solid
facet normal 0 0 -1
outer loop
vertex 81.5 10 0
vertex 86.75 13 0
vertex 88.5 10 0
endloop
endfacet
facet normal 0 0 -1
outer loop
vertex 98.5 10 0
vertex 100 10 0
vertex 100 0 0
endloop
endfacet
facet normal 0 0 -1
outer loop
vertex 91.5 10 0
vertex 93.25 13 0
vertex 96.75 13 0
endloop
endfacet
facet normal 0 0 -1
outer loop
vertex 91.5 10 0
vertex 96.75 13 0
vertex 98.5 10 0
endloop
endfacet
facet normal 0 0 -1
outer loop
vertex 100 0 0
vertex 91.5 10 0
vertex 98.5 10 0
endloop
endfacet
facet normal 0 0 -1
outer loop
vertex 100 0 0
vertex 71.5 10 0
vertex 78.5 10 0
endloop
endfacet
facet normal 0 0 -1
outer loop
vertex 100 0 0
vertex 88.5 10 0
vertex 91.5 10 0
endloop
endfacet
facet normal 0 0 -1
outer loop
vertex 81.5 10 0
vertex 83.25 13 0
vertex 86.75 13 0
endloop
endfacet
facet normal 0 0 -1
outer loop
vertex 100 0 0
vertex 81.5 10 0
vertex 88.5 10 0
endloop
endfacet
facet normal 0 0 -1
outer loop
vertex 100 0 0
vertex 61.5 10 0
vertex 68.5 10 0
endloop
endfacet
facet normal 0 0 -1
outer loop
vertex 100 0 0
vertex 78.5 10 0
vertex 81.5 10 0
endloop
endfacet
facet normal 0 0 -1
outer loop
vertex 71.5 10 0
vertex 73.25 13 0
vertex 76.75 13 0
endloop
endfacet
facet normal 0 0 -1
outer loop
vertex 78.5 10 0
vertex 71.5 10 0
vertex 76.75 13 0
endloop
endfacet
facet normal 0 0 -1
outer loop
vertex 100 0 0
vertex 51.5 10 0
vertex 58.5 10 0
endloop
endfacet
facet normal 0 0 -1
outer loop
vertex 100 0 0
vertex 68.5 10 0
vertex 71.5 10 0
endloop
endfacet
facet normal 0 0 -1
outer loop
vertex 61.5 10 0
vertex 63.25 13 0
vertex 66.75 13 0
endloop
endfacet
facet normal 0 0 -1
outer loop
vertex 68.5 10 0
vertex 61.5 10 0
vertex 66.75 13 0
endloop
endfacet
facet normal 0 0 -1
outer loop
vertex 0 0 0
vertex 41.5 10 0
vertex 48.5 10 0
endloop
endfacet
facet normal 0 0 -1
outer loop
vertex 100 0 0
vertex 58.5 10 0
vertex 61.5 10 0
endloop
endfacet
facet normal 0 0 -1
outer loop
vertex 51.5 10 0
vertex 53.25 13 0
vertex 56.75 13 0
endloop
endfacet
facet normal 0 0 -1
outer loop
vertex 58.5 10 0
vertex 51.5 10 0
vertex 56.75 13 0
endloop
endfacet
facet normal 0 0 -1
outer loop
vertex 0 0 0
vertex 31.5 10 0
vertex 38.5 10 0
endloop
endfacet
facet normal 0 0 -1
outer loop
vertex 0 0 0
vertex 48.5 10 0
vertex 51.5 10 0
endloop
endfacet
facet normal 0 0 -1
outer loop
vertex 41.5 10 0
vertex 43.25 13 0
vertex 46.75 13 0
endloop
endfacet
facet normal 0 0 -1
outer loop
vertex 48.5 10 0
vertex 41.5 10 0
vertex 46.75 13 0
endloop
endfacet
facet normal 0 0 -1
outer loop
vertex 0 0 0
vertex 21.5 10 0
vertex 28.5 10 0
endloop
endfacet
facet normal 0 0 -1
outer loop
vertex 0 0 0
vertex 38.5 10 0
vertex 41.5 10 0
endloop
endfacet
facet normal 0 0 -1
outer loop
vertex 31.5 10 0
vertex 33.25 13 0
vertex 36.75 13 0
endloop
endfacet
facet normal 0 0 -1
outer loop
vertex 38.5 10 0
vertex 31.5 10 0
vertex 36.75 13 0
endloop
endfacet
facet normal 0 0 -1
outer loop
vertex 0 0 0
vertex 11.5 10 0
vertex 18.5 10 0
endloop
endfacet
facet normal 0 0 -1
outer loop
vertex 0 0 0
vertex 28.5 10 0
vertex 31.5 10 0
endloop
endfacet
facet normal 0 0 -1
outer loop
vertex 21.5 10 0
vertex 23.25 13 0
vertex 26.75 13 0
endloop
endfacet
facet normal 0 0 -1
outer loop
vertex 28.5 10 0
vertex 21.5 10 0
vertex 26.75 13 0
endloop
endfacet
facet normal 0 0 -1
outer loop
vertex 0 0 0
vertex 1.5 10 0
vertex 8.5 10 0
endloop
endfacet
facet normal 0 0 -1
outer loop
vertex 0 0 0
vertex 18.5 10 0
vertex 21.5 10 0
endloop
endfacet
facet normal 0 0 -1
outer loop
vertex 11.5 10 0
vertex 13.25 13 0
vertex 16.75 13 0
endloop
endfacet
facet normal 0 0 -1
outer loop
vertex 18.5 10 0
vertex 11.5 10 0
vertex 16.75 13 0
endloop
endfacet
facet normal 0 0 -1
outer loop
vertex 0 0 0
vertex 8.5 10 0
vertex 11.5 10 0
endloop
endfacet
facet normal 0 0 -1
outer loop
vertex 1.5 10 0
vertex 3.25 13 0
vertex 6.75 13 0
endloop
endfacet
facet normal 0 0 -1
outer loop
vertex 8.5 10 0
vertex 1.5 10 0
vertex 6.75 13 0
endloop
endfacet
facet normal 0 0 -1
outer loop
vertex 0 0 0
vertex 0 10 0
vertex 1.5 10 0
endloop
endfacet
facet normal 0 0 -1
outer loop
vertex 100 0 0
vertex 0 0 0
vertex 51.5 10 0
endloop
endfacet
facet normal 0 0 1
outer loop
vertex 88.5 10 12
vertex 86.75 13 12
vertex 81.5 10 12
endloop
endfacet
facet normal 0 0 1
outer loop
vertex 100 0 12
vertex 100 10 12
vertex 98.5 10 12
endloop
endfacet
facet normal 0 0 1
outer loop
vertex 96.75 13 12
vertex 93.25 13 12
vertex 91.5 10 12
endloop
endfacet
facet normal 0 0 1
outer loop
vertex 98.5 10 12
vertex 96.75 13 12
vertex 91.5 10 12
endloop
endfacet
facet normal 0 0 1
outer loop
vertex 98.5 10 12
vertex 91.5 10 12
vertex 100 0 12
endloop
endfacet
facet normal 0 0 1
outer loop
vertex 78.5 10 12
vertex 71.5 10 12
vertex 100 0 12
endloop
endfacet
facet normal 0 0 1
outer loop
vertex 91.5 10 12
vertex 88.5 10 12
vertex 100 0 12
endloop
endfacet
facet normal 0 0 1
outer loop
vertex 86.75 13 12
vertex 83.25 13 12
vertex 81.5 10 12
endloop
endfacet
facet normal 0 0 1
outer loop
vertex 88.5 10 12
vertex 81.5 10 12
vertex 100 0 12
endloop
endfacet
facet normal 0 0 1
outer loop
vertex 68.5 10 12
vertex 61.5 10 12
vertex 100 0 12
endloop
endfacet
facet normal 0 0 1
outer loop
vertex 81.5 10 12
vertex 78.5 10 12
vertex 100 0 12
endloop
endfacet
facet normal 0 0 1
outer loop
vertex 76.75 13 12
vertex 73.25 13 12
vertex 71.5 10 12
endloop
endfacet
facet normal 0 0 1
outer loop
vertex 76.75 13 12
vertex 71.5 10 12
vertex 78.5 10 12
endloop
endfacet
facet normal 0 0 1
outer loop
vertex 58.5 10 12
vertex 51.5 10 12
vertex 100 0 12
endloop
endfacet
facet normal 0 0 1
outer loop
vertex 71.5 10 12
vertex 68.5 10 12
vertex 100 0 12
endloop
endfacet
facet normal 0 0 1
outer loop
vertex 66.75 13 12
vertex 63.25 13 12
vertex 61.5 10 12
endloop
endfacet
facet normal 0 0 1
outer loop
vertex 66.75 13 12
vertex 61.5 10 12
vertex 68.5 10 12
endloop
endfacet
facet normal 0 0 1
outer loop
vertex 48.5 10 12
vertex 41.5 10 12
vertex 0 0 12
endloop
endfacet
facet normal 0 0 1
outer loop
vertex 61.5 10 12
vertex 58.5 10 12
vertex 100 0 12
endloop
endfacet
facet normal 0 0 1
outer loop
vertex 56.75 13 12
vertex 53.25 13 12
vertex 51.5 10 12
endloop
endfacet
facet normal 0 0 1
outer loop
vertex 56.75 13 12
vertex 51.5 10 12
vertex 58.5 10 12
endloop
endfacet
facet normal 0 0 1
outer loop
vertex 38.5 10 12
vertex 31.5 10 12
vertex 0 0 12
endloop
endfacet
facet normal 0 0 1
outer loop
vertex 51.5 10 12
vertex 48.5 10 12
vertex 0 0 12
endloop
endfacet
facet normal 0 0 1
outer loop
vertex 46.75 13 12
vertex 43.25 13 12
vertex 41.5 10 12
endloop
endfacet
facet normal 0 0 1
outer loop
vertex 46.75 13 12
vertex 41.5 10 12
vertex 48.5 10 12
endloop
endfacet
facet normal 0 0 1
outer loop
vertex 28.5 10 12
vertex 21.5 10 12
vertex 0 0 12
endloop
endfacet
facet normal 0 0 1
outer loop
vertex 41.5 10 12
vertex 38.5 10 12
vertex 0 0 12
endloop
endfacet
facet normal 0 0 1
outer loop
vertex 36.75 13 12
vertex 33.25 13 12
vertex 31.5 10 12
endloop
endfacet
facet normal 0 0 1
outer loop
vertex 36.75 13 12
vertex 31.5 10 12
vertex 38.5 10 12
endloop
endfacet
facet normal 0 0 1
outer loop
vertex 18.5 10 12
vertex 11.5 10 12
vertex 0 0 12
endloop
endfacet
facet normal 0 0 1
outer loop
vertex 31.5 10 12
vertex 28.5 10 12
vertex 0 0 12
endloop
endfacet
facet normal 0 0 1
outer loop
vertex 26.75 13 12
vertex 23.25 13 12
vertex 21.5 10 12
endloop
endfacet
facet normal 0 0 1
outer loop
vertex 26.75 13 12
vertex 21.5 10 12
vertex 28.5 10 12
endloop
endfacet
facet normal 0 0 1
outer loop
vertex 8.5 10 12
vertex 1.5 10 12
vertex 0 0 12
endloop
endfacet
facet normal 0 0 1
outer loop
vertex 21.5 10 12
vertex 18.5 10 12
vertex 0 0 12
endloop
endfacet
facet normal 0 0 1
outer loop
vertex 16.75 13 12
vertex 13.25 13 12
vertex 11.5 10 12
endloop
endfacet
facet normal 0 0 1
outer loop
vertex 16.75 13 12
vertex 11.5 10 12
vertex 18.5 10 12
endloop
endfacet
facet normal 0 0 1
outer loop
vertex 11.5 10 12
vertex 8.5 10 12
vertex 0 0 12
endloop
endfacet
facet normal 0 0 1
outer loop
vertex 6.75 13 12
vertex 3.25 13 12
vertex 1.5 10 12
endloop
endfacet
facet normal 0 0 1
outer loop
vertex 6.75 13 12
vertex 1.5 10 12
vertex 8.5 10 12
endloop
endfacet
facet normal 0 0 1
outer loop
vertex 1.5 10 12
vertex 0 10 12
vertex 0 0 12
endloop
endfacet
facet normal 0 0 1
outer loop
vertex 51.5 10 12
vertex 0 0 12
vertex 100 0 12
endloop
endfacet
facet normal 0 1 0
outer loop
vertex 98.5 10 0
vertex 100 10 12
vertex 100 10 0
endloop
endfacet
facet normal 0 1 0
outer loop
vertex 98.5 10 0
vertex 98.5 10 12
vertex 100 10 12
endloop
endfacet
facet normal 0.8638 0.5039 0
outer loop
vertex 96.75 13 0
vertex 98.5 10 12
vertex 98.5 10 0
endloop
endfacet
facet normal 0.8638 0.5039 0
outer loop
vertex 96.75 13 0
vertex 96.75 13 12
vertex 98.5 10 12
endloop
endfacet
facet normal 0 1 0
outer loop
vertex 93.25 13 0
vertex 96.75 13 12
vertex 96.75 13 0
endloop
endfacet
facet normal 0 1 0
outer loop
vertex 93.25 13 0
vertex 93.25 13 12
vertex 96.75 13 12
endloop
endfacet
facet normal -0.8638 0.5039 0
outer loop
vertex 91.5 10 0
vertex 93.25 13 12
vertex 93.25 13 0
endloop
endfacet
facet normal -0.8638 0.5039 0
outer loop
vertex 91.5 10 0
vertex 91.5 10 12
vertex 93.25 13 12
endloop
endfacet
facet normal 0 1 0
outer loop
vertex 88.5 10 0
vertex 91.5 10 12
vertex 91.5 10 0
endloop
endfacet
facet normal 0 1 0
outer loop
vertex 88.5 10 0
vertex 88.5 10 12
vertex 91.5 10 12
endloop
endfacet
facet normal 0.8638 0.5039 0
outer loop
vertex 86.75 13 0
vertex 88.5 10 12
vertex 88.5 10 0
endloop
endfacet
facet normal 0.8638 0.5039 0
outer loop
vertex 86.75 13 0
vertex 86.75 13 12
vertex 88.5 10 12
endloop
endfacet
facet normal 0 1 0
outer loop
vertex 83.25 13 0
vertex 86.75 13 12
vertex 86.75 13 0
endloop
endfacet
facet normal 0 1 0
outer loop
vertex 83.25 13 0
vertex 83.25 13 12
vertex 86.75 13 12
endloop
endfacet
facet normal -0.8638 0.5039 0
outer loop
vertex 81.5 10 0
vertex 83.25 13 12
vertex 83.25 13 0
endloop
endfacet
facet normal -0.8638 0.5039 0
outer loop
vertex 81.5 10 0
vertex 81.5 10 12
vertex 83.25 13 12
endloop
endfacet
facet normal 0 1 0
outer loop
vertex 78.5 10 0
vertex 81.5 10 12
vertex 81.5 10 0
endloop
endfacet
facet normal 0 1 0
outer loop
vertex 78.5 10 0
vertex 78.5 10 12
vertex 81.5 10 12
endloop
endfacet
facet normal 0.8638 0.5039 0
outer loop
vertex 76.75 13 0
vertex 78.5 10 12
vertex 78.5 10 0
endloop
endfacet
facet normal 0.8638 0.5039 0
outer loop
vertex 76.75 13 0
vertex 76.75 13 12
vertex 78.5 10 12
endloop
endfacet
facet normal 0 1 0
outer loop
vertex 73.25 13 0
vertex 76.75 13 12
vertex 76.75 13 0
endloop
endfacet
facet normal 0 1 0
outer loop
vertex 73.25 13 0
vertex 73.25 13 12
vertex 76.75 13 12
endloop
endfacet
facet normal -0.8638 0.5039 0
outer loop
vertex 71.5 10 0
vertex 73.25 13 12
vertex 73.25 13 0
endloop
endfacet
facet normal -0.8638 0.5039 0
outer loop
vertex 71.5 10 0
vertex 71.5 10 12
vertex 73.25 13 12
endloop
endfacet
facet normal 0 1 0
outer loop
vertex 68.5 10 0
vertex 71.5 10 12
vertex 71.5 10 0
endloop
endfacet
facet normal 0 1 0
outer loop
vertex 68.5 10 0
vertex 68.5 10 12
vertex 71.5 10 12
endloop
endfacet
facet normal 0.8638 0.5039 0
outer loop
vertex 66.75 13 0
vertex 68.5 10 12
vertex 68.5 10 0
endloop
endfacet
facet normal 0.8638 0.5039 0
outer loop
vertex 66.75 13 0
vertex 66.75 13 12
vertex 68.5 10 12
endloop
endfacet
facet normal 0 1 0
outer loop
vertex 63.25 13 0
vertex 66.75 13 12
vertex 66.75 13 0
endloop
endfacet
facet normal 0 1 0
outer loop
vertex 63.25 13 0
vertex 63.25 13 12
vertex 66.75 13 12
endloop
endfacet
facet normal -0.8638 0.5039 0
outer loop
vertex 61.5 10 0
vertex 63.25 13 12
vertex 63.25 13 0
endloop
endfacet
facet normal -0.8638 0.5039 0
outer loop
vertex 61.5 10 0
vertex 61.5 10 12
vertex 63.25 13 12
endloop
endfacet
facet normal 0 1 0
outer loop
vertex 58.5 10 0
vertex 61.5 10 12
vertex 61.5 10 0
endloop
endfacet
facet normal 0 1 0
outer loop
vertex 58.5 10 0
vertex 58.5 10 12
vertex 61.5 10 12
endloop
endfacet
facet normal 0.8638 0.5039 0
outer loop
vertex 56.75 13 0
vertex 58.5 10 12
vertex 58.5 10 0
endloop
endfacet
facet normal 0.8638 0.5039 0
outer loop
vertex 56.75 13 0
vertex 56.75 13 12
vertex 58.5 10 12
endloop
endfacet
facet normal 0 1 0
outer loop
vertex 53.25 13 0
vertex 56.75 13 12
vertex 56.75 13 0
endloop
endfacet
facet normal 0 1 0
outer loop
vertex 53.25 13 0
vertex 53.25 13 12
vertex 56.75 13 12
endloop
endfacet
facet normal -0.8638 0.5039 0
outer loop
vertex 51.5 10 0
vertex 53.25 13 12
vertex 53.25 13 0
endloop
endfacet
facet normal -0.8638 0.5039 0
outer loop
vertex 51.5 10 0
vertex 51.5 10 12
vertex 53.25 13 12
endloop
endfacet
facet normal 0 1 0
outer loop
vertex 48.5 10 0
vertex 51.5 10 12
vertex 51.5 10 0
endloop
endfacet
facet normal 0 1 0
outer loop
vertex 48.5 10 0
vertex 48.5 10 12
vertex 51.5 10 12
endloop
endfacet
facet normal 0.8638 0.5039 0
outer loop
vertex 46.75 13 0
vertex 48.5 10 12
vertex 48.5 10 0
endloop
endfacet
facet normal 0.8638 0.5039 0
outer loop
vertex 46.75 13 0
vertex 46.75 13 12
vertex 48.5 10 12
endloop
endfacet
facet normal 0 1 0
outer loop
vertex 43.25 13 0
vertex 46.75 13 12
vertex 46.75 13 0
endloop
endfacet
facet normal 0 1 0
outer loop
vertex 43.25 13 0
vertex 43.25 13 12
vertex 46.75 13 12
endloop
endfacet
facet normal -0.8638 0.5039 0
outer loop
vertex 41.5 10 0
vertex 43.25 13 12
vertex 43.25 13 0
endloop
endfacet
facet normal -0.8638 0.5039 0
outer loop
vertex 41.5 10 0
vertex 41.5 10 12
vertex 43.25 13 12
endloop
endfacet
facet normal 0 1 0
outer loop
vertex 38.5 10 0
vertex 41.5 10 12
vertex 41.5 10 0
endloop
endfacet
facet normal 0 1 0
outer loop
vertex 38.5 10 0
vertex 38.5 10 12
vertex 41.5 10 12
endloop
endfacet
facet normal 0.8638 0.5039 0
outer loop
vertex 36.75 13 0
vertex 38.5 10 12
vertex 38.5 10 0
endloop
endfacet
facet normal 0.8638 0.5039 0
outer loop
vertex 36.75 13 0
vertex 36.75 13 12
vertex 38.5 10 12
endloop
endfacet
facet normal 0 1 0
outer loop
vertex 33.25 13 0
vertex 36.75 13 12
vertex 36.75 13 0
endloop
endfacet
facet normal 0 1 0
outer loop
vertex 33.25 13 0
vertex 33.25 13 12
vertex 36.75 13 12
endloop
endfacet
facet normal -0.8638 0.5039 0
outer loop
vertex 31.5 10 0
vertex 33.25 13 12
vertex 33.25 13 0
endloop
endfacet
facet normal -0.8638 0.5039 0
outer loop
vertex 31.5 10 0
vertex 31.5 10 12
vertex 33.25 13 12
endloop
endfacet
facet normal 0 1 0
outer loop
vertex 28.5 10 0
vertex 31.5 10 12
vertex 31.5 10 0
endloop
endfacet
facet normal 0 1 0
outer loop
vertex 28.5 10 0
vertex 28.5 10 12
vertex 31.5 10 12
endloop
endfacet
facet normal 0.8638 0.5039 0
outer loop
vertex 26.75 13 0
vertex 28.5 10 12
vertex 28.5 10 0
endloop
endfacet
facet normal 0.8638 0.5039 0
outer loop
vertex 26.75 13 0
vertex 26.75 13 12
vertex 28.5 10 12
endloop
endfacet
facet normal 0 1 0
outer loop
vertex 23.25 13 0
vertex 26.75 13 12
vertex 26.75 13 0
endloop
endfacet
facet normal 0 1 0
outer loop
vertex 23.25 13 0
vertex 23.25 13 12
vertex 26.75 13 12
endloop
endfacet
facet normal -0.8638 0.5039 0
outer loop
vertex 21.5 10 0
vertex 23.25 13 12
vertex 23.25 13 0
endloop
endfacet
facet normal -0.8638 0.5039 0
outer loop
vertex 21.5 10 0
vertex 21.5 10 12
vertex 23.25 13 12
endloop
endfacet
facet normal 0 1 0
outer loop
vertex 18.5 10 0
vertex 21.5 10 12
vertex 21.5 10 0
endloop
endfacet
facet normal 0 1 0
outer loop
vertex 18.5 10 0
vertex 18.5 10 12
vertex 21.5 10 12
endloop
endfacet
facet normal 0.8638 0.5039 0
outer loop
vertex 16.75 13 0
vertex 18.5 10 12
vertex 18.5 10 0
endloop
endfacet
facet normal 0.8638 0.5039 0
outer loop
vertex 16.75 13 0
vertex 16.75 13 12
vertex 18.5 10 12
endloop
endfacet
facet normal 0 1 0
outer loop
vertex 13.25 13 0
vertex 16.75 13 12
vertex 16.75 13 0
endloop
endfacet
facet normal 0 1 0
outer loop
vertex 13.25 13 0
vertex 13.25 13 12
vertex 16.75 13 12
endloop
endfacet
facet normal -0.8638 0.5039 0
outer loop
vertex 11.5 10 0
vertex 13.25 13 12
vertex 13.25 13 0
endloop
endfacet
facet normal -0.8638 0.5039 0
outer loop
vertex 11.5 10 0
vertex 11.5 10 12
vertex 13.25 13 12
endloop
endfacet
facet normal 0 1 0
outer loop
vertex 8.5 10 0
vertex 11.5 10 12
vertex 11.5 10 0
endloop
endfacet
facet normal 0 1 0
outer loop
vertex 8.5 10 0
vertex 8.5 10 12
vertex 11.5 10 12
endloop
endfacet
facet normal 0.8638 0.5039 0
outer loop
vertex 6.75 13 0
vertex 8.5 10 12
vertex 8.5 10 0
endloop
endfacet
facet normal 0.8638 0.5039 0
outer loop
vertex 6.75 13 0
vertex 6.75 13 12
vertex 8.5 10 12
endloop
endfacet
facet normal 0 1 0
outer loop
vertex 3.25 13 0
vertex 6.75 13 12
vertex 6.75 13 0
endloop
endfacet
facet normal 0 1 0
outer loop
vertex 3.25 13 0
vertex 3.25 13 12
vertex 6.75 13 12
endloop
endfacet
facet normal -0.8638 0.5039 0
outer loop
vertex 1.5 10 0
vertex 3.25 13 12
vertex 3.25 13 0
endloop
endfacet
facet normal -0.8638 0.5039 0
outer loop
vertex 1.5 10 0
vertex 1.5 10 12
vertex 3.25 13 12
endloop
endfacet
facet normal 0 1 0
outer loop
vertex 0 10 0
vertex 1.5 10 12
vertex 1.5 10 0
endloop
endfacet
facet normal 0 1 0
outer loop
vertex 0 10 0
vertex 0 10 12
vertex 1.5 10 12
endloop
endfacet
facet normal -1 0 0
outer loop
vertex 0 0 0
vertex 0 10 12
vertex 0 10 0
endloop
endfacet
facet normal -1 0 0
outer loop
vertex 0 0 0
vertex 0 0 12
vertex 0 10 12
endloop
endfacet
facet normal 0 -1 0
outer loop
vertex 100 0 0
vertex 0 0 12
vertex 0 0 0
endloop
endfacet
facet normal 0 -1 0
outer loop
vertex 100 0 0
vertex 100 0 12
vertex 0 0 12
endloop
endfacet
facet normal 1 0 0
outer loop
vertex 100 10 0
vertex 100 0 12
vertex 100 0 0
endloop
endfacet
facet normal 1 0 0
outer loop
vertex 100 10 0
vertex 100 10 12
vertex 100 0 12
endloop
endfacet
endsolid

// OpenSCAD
$fn = 32;

// ----------------------------------------------------------------------
// Gear rack: 10 teeth, pitch 10 mm
// ----------------------------------------------------------------------

// --- parameters (mm) ---
teeth = 10;               // number of teeth
pitch = 10;               // tooth pitch, X
root_w = 7;               // tooth width at the root
tip_w = 3.5;              // tooth width at the tip
base_h = 10;              // rack body height, Y
tooth_h = 3;              // tooth height above the body
plate_t = 12;             // rack width, Z (extrusion height)

rack_l = teeth * pitch;  // overall length
total_h = base_h + tooth_h;  // overall height

profile = [[0, 0], [100, 0], [100, 10], [98.5, 10], [96.75, 13], [93.25, 13], [91.5, 10], [88.5, 10], [86.75, 13], [83.25, 13], [81.5, 10], [78.5, 10], [76.75, 13], [73.25, 13], [71.5, 10], [68.5, 10], [66.75, 13], [63.25, 13], [61.5, 10], [58.5, 10], [56.75, 13], [53.25, 13], [51.5, 10], [48.5, 10], [46.75, 13], [43.25, 13], [41.5, 10], [38.5, 10], [36.75, 13], [33.25, 13], [31.5, 10], [28.5, 10], [26.75, 13], [23.25, 13], [21.5, 10], [18.5, 10], [16.75, 13], [13.25, 13], [11.5, 10], [8.5, 10], [6.75, 13], [3.25, 13], [1.5, 10], [0, 10]];  // primary outline, 44 points, counter clockwise

// --- the one profile operation ---
linear_extrude(height = plate_t) polygon(points = profile);
